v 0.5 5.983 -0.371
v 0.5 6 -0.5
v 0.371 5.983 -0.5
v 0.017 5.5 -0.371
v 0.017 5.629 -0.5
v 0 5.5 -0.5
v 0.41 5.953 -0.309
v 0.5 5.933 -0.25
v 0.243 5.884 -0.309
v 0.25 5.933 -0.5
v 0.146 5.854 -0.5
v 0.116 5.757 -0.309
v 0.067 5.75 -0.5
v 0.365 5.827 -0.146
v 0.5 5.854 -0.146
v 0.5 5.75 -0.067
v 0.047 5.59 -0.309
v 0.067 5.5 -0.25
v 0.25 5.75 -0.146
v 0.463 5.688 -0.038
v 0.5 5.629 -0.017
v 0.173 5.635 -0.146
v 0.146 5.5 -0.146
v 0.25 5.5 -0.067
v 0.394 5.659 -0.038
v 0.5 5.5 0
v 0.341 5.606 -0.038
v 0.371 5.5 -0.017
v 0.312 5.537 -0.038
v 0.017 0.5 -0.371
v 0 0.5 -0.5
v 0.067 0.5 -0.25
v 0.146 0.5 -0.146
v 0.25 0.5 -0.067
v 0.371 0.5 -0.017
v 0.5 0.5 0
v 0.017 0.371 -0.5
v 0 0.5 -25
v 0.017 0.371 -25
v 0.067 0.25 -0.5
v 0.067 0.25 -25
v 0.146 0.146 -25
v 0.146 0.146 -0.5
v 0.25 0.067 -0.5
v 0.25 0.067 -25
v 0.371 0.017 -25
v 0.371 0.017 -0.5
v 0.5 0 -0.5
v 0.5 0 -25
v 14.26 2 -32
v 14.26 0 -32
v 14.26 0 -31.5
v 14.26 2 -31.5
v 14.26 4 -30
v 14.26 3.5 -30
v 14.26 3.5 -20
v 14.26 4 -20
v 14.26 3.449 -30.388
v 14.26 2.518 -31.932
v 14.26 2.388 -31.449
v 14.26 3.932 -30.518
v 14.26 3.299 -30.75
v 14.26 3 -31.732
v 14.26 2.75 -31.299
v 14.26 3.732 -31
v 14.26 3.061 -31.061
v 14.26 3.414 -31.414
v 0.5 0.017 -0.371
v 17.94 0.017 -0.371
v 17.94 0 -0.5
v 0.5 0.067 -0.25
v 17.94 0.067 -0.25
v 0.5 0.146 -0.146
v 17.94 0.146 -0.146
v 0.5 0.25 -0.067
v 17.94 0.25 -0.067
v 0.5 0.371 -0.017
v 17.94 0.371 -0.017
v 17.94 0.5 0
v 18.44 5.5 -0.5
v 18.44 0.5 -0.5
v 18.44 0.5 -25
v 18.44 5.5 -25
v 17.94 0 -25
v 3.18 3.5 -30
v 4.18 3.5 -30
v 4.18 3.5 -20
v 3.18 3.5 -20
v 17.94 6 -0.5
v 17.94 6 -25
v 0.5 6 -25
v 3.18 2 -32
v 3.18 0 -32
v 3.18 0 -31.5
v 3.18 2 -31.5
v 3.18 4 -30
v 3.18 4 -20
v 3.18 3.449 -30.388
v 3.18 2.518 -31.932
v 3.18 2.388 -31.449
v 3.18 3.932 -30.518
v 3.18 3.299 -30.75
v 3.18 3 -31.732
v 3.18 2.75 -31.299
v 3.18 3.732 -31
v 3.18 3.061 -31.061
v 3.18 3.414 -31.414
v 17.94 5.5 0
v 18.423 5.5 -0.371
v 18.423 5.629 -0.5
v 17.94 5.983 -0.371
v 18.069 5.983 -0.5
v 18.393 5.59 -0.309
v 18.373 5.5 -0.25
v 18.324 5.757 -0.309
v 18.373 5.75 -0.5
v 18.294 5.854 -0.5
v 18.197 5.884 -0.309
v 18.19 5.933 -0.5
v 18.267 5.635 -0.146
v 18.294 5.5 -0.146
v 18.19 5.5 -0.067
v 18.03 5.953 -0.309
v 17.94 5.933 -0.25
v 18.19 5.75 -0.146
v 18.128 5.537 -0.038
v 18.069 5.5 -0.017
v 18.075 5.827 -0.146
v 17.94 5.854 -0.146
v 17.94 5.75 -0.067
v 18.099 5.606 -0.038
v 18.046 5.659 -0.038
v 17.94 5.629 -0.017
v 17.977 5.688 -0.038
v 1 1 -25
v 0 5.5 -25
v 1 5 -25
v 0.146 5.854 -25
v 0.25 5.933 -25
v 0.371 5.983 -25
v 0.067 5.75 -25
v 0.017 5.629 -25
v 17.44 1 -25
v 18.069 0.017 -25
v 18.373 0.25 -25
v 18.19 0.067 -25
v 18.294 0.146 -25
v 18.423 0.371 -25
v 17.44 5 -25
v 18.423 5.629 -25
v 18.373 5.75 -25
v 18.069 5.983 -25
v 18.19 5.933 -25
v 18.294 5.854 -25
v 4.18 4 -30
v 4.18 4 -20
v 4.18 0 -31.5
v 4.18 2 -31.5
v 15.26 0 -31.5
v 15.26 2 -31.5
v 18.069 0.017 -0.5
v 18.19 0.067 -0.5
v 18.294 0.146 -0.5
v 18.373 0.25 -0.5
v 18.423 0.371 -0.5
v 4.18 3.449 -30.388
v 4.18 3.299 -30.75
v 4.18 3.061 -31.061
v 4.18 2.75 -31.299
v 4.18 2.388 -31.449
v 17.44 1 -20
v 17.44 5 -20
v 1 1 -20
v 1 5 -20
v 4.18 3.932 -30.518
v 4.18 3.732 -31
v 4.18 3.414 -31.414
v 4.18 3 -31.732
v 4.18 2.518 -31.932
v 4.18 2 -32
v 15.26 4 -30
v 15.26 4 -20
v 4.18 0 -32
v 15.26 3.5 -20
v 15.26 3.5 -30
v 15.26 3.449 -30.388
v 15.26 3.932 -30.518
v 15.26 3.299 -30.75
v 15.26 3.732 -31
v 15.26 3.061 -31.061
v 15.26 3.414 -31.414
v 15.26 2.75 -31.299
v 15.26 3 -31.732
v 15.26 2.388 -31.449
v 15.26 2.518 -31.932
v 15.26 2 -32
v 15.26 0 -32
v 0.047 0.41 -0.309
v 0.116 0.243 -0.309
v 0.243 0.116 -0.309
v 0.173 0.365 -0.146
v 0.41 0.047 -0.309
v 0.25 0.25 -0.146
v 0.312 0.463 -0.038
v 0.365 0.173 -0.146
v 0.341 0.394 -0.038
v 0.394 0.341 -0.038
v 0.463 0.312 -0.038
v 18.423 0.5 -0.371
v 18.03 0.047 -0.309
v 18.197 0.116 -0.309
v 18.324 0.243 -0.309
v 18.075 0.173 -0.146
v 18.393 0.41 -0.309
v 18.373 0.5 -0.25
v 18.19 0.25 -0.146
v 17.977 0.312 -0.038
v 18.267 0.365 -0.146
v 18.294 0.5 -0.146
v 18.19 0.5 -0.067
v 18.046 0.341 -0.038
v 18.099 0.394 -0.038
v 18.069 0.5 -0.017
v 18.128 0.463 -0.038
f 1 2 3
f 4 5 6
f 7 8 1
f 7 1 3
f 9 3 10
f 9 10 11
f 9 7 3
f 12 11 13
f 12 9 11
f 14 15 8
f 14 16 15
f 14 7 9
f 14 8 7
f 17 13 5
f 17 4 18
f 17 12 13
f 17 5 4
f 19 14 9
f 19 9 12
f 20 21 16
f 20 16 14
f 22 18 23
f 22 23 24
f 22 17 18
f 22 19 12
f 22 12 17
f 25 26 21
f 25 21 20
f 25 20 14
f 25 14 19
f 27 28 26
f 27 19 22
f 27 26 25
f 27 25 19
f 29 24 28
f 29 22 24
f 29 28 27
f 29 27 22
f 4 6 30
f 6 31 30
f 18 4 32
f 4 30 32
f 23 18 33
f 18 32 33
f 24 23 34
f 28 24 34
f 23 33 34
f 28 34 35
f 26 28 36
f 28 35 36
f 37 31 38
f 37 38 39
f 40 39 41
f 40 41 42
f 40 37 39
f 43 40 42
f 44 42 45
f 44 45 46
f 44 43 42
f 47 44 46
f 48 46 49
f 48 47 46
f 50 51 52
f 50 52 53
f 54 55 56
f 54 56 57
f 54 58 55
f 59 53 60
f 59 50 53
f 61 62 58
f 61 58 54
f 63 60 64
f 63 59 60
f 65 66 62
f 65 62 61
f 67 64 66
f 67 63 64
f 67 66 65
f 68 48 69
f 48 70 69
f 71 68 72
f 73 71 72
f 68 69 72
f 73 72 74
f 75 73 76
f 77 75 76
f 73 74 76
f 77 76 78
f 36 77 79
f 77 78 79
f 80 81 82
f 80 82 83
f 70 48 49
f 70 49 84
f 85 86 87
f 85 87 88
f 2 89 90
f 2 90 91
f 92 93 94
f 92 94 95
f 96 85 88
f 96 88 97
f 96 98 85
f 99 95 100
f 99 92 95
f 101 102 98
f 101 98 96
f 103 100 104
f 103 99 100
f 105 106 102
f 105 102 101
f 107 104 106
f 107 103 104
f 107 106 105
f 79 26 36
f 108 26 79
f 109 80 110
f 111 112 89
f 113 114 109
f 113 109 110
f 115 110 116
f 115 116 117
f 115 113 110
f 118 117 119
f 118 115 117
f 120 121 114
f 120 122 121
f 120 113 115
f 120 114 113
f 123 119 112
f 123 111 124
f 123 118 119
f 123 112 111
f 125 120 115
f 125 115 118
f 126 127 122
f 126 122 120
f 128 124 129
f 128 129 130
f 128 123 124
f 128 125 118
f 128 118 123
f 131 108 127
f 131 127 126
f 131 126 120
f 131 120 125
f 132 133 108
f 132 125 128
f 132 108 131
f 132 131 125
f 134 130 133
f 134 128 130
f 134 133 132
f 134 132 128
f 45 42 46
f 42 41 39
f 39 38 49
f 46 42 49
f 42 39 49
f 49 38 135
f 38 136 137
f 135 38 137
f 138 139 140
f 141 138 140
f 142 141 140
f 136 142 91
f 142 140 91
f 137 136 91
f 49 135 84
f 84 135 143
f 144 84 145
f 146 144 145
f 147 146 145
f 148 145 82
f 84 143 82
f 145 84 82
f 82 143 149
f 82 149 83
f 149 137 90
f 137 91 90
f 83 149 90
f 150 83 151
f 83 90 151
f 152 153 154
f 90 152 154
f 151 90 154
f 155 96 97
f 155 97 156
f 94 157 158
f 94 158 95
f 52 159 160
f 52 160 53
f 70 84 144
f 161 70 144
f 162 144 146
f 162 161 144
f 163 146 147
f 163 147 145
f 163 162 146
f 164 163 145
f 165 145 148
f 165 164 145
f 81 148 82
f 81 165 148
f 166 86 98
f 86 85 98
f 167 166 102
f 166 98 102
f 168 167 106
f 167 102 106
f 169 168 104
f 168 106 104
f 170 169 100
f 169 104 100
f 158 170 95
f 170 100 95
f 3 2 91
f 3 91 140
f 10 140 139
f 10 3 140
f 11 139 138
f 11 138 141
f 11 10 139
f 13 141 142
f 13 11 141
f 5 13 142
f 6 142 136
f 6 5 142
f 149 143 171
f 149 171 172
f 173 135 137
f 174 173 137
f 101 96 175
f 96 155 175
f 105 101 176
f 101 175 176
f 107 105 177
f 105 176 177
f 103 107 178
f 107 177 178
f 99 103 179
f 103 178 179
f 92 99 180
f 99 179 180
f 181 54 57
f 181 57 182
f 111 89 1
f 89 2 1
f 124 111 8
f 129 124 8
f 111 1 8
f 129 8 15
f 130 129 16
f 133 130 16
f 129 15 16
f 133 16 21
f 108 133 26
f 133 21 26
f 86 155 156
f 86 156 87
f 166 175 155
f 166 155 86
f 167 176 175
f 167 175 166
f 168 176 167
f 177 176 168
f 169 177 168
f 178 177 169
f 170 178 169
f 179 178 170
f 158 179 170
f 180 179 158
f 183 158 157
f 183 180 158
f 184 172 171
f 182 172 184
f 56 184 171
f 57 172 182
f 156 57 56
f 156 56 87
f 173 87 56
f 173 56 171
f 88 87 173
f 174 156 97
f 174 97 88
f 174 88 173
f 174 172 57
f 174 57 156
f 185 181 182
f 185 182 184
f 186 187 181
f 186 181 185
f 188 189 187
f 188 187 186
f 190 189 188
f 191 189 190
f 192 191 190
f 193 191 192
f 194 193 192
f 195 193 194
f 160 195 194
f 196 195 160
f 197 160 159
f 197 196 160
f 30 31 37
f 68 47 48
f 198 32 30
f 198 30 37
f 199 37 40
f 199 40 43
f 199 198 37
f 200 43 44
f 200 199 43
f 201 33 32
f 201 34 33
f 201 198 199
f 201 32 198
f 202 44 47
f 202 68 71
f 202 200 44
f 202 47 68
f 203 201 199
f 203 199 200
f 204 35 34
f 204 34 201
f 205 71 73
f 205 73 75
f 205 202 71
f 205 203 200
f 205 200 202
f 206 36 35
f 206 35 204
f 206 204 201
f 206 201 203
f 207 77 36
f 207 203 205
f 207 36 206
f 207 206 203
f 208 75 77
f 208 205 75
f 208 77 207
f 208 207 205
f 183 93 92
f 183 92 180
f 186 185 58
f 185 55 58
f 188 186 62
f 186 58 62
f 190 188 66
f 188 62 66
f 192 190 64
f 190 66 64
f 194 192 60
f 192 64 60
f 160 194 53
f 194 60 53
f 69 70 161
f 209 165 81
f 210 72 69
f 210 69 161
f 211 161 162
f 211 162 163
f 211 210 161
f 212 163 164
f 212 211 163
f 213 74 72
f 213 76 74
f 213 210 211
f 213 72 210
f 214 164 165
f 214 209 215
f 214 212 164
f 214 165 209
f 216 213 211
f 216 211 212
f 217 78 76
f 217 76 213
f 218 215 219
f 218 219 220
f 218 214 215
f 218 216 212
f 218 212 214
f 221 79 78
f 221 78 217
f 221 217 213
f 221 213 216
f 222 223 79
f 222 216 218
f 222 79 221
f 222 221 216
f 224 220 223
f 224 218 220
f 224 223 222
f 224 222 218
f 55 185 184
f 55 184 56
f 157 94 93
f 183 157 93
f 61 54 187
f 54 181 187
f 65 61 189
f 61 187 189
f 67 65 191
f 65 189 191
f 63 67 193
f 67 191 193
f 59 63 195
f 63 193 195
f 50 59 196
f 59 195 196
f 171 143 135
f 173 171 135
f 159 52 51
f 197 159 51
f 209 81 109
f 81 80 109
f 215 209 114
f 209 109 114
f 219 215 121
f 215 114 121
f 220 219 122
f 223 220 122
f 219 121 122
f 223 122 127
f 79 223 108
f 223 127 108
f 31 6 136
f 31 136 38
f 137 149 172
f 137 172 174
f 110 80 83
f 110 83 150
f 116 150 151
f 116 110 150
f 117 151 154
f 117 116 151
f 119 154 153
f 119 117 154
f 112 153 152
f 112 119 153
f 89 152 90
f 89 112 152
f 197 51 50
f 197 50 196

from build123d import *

# Parameters (mm, degrees)
EXTRUDE1_DEPTH     = 25
FILLET1_R          = 0.5
SKETCH3_W          = 16.44
SKETCH3_H          = 4
CUT_EXTRUDE1_DEPTH = 5
PROFILE_W          = 1
PROFILE_H          = 0.5


with BuildPart() as part:
    # Sketch2 → Extrude1 (new body)
    with BuildSketch(Plane.XY):
        with BuildLine():
            Line((0.5, 0), (17.94, 0))
            ThreePointArc((17.94, 0), (18.293553391, 0.146446609), (18.44, 0.5))
            Line((18.44, 0.5), (18.44, 5.5))
            ThreePointArc((18.44, 5.5), (18.293553391, 5.853553391), (17.94, 6))
            Line((17.94, 6), (0.5, 6))
            ThreePointArc((0.5, 6), (0.146446609, 5.853553391), (0, 5.5))
            Line((0, 5.5), (0, 0.5))
            ThreePointArc((0, 0.5), (0.146446609, 0.146446609), (0.5, 0))
        make_face()
    extrude(amount=-EXTRUDE1_DEPTH)

    # Fillet1
    fillet1_edges = [part.edges().sort_by_distance(p)[0] for p in [
        (9.22, 6, 0),
        (18.293553391, 5.853553391, 0),
        (18.44, 3, 0),
        (18.293553391, 0.146446609, 0),
        (9.22, 0, 0),
        (0.146446609, 0.146446609, 0),
        (0, 3, 0),
        (0.146446609, 5.853553391, 0),
    ]]
    fillet(fillet1_edges, radius=FILLET1_R)

    # Sketch3 → Cut-Extrude1 (cut)
    with BuildSketch(Plane(origin=(0, 0, -25), x_dir=(-1, 0, 0), z_dir=(0, 0, -1))):
        with Locations((-9.22, 3)):
            Rectangle(SKETCH3_W, SKETCH3_H)
    extrude(amount=-CUT_EXTRUDE1_DEPTH, mode=Mode.SUBTRACT)

    # Sweep1: sweep along a path in Path
    with BuildLine(Plane(origin=(9.22, 0, 0), x_dir=(0, 0, -1), z_dir=(1, 0, 0))) as sweep1_path:
        Line((20, 3.5), (30, 3.5))
        ThreePointArc((30, 3.5), (31.060660172, 3.060660172), (31.5, 2))
        Line((31.5, 2), (31.5, 0))
    # Profile → Sweep1 (sweep)
    with BuildSketch(Plane(origin=(0, 0, -20), x_dir=(-1, 0, 0), z_dir=(0, 0, -1))):
        with Locations((-14.76, 3.75)):
            Rectangle(PROFILE_W, PROFILE_H)
        with Locations((-3.68, 3.75)):
            Rectangle(PROFILE_W, PROFILE_H)
    sweep(path=sweep1_path.line)


solid = part.part
